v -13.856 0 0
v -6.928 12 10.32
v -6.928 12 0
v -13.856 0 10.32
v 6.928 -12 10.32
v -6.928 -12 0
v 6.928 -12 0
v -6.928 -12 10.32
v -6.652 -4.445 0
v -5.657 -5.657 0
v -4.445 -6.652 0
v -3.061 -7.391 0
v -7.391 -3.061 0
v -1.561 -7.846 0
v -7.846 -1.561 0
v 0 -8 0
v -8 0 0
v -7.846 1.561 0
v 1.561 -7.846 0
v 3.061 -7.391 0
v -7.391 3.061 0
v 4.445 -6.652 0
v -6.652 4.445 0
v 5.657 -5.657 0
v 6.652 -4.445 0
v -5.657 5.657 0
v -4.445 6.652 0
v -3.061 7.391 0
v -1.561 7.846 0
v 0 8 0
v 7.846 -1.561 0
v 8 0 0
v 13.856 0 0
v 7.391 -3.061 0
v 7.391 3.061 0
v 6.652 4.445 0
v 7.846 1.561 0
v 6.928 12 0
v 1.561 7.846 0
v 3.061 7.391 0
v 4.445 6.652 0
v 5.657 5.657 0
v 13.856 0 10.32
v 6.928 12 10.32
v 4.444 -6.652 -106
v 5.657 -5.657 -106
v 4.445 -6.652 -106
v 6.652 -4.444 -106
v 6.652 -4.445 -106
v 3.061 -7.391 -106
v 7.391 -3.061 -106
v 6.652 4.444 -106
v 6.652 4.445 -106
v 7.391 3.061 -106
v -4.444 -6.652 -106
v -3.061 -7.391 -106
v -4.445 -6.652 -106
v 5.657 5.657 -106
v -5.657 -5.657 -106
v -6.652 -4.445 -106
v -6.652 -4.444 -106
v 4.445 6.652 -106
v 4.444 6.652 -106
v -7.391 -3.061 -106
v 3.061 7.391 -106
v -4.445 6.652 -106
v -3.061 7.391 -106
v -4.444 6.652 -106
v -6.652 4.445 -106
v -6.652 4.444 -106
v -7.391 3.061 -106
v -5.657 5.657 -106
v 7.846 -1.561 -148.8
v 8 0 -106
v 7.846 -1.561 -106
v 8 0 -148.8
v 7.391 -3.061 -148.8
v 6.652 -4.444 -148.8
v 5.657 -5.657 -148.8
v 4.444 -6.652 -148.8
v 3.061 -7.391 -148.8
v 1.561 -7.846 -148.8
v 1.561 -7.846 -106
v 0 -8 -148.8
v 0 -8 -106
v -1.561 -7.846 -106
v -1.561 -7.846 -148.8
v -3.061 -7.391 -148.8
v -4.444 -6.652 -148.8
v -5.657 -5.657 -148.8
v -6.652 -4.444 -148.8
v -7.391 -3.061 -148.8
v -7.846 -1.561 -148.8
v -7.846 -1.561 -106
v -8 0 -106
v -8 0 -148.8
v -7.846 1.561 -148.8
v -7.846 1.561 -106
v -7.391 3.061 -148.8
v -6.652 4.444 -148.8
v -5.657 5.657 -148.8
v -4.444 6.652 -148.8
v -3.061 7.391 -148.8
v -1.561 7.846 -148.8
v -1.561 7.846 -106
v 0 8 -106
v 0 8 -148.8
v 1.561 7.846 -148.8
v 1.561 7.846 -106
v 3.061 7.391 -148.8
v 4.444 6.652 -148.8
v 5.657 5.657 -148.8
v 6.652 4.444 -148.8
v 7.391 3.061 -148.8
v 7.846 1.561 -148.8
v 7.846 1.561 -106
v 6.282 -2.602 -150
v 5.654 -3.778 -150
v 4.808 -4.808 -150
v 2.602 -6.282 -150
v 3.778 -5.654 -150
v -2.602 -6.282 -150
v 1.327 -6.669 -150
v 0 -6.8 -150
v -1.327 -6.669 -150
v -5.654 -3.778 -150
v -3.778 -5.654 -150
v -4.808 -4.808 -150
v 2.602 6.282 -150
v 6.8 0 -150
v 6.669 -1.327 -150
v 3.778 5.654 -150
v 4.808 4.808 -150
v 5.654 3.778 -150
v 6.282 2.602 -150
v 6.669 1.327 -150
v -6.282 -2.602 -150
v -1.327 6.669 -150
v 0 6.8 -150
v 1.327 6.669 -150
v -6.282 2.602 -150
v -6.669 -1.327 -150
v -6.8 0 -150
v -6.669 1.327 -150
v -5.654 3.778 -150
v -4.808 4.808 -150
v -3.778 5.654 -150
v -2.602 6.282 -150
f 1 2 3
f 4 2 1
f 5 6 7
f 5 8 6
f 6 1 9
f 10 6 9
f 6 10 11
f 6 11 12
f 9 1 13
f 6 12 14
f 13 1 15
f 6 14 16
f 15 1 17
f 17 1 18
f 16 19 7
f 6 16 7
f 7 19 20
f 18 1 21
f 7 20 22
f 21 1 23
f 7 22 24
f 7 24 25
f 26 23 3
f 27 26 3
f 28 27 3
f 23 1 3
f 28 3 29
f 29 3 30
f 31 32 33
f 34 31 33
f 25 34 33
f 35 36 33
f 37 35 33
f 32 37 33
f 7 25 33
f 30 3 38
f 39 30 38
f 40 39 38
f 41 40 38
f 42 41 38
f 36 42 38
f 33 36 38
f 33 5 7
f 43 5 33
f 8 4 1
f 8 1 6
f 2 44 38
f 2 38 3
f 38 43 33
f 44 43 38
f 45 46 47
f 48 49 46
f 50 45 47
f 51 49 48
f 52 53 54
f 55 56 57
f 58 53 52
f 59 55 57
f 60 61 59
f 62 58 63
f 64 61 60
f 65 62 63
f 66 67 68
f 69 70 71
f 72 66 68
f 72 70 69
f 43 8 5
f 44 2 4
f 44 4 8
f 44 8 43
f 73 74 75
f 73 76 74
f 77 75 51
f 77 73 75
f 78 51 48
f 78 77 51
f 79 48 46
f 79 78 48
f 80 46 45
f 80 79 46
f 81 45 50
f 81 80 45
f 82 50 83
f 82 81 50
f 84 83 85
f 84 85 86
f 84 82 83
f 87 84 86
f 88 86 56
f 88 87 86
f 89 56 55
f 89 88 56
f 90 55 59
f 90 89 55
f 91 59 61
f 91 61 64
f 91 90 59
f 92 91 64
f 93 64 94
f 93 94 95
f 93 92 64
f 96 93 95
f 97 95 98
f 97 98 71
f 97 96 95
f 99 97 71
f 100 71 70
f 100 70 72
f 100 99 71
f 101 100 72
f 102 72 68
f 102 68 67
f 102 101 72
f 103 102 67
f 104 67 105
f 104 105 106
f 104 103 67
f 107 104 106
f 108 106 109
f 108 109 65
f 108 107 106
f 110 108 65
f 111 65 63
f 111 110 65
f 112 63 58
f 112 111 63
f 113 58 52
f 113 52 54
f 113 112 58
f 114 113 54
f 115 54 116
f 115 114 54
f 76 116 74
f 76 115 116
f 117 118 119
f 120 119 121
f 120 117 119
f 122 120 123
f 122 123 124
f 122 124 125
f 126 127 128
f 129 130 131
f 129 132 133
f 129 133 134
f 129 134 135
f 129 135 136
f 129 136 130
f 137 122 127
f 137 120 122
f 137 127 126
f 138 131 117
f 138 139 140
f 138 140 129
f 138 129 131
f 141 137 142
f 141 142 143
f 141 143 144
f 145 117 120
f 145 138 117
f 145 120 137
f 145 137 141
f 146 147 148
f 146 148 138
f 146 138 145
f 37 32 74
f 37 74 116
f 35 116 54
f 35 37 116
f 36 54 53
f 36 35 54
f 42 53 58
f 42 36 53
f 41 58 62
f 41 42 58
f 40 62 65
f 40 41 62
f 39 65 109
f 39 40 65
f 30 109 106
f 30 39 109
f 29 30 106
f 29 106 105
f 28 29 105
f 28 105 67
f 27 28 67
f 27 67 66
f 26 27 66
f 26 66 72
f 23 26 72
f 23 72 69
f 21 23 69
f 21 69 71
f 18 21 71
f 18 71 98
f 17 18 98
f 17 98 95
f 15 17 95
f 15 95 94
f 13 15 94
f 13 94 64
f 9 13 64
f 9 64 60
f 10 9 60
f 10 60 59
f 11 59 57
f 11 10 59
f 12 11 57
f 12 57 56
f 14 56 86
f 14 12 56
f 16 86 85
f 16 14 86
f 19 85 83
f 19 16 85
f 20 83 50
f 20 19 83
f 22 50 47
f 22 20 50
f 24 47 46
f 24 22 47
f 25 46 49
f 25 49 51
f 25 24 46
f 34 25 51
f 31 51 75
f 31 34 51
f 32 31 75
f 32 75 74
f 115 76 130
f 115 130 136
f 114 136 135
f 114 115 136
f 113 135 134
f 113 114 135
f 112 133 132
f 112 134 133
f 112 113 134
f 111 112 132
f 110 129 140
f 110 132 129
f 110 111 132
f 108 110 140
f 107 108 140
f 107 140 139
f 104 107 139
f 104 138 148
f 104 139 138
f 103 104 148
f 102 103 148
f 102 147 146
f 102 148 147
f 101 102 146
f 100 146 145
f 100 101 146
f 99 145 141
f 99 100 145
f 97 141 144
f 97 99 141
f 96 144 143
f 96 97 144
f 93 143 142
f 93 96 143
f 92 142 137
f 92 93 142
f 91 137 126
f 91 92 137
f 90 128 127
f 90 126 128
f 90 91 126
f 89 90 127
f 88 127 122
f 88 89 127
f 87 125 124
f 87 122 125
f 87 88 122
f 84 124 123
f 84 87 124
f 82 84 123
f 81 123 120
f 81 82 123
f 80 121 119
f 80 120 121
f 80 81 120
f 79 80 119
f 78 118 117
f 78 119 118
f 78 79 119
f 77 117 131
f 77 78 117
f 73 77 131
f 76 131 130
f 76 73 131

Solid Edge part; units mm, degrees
sketch "Sketch1" plane through (0, 0, 0) normal (0, 0, 1) x (1, 0, 0)
  circle A0 centre (0, 0) radius 13.92
  dimension "D1" = 27.84
extrude "Protrusion1" add sketch "Sketch1" along normal blind 10.32
sketch "Sketch2" plane through (0, 0, 0) normal (0, 0, -1) x (1, 0, 0)
  circle A0 centre (0, 0) radius 8
extrude "Protrusion2" add sketch "Sketch2" along normal blind 150
sketch "Sketch3" plane through (0, 0, -150) normal (0, 0, -1) x (1, 0, 0)
  circle A0 centre (0, 0) radius 7.9997
extrude "Cutout1" cut sketch "Sketch3" against normal blind 44 flip side to cut
chamfer "Chamfer_1" distance 1.2 angle 45 1 edges at (-7.9997, 0, -150)
sketch "Sketch4" plane through (0, 0, 10.32) normal (0, 0, 1) x (1, 0, 0)
  line L0 (-7.0545, 12) -> (7.0545, 12)
  dimension "D1" = 24
extrude "Cutout2" cut sketch "Sketch4" against normal up to next material side at (0, 12.05, 10.32)
pattern_circular "Pattern1" count 6 over 360 about axis through (0, 0, 10.32) along (0, 0, 1) of "Cutout2"
properties part number "215564" material "Stainless Steel, 304"
